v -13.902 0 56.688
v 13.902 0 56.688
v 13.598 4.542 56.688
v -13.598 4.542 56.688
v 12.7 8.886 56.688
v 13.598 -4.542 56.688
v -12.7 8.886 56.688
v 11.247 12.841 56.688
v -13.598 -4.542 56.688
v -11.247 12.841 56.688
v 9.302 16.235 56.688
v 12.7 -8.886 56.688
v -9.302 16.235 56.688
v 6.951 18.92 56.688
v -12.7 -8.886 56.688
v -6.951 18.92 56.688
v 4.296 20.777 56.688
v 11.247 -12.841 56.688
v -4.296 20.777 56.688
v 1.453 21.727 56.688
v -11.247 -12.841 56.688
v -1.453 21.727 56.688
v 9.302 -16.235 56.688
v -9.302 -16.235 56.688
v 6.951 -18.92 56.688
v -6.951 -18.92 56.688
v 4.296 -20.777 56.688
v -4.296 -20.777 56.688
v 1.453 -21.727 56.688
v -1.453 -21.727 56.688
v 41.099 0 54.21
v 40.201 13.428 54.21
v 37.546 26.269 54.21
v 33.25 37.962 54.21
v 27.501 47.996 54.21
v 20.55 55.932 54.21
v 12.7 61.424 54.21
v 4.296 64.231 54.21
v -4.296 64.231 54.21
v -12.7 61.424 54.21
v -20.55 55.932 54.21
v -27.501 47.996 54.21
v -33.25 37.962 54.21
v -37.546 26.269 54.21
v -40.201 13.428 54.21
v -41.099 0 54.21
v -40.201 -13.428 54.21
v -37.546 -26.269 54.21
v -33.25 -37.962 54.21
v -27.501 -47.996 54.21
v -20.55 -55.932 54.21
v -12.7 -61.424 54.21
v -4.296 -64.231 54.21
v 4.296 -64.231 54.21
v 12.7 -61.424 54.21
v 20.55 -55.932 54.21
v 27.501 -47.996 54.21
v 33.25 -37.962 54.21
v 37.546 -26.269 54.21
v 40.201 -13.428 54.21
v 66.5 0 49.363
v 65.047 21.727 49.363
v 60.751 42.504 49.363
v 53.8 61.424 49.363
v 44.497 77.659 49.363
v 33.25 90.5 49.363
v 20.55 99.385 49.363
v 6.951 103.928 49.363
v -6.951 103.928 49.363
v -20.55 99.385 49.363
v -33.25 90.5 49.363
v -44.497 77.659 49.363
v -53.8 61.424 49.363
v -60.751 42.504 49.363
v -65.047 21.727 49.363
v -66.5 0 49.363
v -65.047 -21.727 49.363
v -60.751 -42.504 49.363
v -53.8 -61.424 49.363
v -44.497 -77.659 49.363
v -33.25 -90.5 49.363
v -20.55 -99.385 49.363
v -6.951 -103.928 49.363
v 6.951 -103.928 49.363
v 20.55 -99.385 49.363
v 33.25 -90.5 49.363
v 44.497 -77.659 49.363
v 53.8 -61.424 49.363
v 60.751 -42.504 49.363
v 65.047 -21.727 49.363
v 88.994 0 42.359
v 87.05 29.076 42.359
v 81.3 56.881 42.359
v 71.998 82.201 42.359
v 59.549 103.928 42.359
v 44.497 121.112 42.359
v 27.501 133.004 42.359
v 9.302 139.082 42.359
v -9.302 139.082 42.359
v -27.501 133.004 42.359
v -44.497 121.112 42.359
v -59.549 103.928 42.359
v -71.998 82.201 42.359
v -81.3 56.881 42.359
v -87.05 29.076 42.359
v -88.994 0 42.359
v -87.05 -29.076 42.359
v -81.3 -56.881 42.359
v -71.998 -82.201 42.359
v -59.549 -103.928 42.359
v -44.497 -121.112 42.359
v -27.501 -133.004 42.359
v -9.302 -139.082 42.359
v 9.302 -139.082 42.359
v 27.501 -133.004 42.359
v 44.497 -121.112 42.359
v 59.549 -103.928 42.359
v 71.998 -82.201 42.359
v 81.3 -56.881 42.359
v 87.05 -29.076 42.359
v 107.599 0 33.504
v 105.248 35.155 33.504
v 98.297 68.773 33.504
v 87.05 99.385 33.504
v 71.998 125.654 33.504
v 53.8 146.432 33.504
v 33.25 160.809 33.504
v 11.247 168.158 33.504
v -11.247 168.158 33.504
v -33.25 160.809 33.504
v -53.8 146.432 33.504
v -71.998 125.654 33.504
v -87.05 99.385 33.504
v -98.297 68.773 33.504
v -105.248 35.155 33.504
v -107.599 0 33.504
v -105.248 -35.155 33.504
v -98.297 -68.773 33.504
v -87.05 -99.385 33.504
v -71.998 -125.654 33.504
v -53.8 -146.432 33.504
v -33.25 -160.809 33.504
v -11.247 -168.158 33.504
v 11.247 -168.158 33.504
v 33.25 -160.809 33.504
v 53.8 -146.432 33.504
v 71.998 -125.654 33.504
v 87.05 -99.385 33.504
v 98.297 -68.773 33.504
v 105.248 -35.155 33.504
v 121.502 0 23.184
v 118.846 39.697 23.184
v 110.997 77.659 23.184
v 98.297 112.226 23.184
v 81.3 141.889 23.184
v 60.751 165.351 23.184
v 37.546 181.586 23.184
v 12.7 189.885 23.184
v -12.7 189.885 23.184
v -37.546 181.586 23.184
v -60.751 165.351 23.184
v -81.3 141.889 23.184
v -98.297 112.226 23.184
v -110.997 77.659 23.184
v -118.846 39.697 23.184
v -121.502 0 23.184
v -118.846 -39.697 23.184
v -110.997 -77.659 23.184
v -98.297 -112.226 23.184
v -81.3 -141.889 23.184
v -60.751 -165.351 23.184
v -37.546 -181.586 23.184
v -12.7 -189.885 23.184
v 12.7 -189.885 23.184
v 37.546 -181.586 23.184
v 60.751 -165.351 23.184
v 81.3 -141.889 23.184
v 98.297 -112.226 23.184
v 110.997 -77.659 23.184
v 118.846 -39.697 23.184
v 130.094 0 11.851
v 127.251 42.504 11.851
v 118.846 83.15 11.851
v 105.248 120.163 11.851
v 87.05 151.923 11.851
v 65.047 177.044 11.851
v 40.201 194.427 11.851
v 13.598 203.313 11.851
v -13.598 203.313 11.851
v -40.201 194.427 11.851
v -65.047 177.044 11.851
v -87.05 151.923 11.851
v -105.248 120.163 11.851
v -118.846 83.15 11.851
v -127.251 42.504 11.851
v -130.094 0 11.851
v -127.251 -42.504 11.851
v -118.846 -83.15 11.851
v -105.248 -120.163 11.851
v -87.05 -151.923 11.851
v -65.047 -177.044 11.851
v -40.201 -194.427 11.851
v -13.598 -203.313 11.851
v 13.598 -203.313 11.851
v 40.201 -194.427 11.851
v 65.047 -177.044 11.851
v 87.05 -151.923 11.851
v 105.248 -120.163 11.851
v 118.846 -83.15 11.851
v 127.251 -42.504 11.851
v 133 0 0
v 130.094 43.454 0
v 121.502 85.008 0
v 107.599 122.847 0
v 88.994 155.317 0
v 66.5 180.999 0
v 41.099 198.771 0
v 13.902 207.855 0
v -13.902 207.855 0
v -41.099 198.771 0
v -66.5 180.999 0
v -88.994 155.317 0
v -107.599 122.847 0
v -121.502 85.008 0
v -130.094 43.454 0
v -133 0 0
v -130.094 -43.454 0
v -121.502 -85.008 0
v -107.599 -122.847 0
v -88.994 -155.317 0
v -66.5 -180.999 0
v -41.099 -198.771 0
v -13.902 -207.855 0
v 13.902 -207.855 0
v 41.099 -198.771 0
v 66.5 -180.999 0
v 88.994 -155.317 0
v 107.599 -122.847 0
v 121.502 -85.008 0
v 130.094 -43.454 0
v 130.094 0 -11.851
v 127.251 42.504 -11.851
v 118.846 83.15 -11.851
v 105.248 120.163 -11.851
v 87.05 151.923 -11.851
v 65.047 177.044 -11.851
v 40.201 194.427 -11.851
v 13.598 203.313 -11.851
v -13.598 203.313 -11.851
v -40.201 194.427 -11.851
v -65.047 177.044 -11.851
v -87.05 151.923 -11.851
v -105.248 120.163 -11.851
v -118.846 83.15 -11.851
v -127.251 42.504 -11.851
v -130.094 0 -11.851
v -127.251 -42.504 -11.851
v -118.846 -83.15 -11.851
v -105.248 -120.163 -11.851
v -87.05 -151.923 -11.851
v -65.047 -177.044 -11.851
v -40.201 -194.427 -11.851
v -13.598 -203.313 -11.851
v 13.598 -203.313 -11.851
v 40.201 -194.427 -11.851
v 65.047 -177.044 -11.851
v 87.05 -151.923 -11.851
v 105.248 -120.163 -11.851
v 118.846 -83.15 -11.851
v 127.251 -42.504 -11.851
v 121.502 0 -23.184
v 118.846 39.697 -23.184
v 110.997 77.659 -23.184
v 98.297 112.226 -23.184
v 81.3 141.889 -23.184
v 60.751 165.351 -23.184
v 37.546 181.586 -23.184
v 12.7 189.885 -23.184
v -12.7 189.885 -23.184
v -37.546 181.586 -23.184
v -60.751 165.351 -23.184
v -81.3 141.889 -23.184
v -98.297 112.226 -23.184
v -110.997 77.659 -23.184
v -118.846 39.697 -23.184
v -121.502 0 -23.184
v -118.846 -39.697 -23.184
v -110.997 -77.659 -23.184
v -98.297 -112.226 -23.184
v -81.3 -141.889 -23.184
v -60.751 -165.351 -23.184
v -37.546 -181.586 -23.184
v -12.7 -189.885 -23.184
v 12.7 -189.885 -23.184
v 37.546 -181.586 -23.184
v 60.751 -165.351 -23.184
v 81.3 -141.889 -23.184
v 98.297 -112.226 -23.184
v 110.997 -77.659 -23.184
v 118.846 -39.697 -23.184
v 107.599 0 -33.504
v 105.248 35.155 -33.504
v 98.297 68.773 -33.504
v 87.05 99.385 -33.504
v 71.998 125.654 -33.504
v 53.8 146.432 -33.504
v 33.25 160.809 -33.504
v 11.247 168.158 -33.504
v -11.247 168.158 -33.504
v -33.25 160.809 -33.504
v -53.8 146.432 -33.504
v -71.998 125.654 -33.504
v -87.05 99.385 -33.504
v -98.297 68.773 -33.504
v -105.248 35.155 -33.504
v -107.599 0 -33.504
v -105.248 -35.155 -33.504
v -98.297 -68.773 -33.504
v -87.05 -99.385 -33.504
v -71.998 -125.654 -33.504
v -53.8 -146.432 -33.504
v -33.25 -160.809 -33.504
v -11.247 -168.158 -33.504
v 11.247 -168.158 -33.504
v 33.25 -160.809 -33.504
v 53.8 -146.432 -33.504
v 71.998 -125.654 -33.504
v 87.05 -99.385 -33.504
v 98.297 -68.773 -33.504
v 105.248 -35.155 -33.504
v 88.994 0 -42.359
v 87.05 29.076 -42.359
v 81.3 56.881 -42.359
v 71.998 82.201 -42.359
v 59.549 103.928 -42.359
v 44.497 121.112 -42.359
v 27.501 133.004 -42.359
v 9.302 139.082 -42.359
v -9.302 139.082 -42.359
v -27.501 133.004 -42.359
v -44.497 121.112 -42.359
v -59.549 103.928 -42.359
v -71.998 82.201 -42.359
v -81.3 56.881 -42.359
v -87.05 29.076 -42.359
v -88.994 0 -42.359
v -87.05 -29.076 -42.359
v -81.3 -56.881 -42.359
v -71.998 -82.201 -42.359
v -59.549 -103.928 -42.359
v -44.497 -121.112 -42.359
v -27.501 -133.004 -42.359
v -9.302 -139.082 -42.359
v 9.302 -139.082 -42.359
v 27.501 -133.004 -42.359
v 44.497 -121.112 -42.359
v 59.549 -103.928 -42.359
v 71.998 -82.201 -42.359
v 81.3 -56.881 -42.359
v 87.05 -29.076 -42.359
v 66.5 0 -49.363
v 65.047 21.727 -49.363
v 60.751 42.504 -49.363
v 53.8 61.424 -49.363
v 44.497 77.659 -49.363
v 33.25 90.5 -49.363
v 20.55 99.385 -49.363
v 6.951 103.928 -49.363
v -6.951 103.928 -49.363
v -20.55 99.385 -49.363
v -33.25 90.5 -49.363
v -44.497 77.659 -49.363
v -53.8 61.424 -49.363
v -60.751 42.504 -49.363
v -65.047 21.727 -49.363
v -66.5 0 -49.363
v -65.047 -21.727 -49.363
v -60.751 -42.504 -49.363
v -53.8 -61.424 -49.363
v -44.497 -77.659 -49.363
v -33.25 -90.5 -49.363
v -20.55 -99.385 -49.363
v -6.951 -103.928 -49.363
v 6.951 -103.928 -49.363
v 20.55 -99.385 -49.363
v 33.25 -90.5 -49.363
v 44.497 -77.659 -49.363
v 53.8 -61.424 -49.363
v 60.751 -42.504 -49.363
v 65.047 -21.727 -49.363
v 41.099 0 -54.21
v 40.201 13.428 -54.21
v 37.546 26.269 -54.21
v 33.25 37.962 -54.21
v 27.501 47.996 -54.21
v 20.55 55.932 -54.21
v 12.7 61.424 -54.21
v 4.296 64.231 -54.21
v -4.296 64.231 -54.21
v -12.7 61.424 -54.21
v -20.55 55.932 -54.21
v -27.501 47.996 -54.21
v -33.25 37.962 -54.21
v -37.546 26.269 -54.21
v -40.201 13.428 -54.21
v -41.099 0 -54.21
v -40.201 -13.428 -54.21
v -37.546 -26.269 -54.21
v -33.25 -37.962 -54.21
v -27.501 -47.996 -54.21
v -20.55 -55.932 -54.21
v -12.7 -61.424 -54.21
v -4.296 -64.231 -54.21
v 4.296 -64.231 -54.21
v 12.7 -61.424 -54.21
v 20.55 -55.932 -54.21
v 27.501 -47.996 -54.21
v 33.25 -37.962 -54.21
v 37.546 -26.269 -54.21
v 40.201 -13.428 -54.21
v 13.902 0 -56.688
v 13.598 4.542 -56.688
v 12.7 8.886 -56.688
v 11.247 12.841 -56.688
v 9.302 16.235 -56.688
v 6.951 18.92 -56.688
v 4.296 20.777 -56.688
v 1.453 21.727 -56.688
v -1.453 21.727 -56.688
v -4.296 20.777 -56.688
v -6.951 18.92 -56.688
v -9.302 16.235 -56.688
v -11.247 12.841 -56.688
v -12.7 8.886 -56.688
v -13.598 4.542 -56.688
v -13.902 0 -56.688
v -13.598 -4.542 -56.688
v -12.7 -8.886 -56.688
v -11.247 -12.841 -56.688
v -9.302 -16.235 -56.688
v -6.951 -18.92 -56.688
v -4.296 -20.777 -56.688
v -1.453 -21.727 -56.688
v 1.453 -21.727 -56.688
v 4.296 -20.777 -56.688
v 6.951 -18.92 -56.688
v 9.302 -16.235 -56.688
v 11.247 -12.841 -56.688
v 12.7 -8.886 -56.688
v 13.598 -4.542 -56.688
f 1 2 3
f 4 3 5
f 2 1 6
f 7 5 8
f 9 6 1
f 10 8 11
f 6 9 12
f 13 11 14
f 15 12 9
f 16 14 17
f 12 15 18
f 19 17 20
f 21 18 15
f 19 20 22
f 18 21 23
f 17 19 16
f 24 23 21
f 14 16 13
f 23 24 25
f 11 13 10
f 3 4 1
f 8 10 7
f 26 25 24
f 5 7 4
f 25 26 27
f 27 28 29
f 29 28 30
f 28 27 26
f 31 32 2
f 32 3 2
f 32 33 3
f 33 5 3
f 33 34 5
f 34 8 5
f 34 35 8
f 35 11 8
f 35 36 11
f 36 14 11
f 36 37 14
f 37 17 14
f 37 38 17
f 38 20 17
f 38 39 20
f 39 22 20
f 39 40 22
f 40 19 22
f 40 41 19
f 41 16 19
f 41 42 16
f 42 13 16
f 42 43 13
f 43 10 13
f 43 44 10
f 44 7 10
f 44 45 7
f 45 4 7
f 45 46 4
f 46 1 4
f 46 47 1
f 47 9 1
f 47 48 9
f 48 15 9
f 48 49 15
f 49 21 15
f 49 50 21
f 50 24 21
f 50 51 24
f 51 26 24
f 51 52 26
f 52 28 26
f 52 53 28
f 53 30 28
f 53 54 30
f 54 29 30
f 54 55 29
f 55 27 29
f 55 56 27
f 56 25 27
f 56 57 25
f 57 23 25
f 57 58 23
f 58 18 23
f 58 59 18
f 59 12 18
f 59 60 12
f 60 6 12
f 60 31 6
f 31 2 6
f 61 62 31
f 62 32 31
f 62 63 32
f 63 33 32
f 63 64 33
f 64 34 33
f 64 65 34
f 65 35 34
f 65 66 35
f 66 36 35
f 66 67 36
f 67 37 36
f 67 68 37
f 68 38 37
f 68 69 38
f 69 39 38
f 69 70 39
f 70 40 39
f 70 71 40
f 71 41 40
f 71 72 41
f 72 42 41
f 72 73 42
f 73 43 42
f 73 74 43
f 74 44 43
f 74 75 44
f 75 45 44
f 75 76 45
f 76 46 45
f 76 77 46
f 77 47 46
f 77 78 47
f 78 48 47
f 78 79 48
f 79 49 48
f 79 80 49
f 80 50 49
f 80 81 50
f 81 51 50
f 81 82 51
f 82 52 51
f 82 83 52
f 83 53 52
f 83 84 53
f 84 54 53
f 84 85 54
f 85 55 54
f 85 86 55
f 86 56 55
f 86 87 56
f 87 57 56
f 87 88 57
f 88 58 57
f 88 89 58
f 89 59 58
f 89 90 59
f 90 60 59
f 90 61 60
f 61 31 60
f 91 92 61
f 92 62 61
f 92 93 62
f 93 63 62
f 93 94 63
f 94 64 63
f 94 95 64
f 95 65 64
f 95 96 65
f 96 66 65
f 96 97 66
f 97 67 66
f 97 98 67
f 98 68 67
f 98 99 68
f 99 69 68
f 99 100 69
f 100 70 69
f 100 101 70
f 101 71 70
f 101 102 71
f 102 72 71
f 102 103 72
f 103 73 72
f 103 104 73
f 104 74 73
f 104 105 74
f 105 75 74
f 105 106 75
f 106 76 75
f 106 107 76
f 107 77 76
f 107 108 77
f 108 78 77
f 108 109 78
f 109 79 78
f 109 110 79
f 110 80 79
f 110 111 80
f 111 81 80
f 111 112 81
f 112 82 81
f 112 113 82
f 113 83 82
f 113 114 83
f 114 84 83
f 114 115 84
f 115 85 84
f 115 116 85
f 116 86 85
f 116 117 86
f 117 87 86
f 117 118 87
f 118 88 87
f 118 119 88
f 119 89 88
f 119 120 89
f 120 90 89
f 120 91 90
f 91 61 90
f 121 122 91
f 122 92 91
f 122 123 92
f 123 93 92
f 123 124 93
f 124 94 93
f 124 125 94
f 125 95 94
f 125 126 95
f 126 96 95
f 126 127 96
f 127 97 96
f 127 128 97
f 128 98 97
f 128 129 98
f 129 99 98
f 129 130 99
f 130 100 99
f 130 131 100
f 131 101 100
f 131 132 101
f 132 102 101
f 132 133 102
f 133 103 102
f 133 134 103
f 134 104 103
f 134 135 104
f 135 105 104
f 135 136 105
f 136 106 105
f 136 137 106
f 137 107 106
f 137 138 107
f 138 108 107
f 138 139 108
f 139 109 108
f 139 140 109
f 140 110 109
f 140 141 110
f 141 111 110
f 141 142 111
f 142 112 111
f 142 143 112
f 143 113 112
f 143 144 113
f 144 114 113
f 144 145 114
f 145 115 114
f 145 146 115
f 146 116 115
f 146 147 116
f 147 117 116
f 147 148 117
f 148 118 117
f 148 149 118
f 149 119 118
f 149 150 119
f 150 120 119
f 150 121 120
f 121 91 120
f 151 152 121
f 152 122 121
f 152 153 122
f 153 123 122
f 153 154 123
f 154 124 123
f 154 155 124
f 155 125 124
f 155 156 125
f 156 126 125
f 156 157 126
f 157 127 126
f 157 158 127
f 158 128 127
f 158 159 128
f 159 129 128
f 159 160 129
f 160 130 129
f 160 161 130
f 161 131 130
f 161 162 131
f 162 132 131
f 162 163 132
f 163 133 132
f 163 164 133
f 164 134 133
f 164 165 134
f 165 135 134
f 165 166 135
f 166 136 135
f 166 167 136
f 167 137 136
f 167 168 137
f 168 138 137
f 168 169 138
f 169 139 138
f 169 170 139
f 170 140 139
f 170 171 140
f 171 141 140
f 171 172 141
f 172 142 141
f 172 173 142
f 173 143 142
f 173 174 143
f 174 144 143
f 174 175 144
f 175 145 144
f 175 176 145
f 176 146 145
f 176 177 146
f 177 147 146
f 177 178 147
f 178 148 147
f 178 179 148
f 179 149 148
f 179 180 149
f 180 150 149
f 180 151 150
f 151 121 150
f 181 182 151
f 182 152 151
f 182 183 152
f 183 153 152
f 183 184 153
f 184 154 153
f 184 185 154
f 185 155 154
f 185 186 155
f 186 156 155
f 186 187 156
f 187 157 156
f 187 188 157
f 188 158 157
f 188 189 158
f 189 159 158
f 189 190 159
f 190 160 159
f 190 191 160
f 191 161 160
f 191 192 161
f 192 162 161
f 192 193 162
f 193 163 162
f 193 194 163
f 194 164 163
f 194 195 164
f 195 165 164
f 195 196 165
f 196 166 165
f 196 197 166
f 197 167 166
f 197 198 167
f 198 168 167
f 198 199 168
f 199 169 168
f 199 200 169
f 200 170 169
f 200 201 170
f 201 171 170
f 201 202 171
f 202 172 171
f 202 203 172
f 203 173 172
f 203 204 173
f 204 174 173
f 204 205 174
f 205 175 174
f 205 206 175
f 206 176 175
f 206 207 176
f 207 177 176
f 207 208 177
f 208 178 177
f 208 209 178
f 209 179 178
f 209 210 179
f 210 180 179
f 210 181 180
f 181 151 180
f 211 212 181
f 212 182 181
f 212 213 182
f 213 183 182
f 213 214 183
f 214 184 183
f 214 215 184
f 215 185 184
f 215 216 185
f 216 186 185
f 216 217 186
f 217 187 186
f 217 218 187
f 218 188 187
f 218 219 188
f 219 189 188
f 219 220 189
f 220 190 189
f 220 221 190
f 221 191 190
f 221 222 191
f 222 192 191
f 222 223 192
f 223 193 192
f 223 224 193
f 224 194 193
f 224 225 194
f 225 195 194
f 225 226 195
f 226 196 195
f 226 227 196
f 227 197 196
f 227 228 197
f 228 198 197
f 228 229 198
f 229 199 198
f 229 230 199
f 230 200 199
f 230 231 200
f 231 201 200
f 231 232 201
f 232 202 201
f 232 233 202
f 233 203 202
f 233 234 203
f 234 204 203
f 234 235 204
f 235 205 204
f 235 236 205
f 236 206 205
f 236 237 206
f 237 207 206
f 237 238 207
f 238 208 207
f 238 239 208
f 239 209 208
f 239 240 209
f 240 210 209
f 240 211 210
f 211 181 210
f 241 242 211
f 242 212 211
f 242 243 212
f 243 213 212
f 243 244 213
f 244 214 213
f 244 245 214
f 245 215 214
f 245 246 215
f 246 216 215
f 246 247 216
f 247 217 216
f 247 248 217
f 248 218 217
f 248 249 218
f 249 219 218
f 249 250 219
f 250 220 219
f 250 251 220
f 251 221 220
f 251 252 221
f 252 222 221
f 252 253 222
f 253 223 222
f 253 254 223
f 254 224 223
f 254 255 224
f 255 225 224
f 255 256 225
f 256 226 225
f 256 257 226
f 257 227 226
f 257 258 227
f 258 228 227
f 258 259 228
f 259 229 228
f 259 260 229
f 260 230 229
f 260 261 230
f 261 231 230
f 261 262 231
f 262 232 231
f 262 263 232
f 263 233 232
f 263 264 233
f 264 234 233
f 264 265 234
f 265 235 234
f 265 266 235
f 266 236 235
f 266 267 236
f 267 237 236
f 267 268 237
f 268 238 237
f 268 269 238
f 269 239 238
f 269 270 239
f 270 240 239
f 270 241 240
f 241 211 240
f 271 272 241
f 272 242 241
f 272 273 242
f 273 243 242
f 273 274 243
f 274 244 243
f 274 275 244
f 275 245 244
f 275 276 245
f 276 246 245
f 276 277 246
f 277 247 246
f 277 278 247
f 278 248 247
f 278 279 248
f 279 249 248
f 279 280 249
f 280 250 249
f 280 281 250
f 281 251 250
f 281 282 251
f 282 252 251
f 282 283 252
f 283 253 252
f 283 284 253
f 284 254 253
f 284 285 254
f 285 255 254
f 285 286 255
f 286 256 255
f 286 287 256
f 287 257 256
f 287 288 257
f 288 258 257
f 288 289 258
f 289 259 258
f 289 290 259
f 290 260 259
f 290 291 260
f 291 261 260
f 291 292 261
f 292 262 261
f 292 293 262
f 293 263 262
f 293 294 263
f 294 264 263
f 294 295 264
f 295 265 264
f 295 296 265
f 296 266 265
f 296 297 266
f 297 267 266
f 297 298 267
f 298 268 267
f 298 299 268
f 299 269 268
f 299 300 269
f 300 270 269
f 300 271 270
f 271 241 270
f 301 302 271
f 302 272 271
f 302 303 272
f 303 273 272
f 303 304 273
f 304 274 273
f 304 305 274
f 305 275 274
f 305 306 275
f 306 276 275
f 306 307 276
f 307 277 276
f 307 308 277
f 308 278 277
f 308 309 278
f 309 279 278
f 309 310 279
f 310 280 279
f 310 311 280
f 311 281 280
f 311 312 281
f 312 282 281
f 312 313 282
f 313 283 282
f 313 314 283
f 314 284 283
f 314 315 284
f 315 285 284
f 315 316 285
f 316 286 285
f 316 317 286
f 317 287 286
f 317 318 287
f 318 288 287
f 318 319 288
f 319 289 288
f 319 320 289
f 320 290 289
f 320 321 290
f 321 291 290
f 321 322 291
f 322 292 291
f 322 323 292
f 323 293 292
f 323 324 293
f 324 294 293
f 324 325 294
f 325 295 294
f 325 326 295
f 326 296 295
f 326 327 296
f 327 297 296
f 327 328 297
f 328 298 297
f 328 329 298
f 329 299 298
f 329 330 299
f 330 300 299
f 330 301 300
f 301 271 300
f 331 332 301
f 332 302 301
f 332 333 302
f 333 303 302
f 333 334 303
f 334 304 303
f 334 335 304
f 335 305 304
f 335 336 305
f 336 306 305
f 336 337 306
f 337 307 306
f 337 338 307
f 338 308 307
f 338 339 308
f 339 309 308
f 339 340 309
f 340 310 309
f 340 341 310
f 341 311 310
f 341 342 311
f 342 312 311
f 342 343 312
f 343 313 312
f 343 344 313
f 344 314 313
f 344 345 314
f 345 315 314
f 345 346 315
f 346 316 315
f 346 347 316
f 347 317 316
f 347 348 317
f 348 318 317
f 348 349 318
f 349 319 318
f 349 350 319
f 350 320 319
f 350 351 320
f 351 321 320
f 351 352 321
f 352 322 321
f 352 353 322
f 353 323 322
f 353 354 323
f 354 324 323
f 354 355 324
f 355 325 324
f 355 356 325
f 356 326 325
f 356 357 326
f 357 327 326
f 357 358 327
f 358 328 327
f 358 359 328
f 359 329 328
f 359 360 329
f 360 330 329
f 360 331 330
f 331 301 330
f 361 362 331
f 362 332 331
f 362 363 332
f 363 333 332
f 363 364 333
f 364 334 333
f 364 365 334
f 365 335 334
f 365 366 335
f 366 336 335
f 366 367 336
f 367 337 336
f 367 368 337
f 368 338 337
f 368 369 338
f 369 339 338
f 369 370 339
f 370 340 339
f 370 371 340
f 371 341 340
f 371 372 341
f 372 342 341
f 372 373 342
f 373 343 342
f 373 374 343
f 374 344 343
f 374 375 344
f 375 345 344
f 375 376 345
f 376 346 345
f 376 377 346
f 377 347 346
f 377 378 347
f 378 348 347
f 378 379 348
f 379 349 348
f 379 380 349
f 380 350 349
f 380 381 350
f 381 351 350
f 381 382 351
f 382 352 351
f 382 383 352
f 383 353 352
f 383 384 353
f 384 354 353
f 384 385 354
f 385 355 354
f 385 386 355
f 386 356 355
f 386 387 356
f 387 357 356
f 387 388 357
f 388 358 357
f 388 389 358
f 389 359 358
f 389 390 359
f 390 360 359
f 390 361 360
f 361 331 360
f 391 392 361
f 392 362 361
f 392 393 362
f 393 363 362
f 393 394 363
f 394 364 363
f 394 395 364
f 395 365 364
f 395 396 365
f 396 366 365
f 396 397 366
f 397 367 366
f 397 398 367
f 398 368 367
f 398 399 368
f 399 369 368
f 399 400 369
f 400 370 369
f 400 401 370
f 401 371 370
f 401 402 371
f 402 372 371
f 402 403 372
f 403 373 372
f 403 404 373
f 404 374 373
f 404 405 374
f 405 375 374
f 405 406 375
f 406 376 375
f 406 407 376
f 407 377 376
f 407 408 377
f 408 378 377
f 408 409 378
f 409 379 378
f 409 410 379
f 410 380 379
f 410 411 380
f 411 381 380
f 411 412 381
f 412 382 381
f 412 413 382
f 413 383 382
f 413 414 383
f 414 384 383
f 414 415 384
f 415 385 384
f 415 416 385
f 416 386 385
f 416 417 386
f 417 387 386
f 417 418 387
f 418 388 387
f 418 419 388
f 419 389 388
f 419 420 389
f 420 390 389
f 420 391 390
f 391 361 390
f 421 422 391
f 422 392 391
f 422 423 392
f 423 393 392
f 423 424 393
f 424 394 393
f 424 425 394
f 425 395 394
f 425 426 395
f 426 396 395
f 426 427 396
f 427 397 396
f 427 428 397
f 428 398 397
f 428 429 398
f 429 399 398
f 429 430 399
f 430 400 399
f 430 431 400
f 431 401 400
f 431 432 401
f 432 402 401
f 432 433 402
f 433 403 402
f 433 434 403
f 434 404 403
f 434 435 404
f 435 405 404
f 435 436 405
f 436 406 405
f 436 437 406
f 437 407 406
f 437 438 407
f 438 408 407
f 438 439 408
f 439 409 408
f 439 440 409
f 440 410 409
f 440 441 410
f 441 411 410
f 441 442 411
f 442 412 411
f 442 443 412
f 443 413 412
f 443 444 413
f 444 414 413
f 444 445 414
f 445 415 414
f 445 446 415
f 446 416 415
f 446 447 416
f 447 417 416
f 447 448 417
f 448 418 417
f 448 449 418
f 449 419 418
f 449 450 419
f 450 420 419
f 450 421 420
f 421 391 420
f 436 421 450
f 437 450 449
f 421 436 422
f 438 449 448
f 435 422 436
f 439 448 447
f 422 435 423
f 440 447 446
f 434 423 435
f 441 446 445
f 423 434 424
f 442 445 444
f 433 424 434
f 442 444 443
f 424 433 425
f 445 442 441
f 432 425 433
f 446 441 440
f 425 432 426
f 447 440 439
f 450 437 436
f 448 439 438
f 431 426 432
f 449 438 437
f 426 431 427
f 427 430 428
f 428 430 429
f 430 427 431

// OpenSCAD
// Generated by SolidPython 1.0.1 on 2020-07-29 00:46:47


scale(v = [7, 11, 3]) {
	sphere(r = 19);
}
/***********************************************
*********      SolidPython code:      **********
************************************************
 
# import packages: SolidPython
from solid import *
from solid.utils import *
from itertools import chain, combinations, permutations


class Resize:

    def __init__(self, scad_file):
        self.scad_file = scad_file
        #self.scad_file = import_scad(scad_file)
        # cone/cylinder param:
        self.r1 = 0
        self.r2 = 0
        self.h = 0
        # rectangular prism param:
        self.w = 0
        self.l = 0
        # ellipse param:
        self.r = 0

    # import OpenScad code (file name corresponds to shape)


    # classify shape + parameters
    def assign(self, param1, param2, param3):
        if self.scad_file == 'cone.scad':
            self.r1 = param1
            self.r2 = param2
            self.h = param3
        elif self.scad_file == 'cylinder.scad':
            self.r1 = param1
            self.r2 = param2
            self.h = param3
        elif self.scad_file == 'rectangularPrism.scad':
            self.h = param1
            self.l = param2
            self.w = param3
        else:
            self.r = param1
            self.h = param2

    # resize parameters
    def iterate(self):
        x = range(3, 20, 2)
        i = 1
        if self.scad_file == 'cone.scad':
            tempList = list(permutations(x, 2))
            for temp in tempList:
                param1 = temp[0]
                param2 = temp[1]
                filepath = 'produced_scad_files/' + 'cone' + str(param1) + '_' + str(param2) + '_' + '.scad'
                scad_render_to_file(cylinder(h=param1, r1=param2, r2=0), filepath)

        elif self.scad_file == 'cylinder.scad':
            tempList = list(permutations(x, 3))
            for temp in tempList:
                param1 = temp[0]
                param2 = temp[1]
                filepath = 'produced_scad_files/' + 'cylinder' + str(param1) + '_' + str(param2) + '_' + '.scad'
                scad_render_to_file(cylinder(h=param1, r1=param2, r2=param2), filepath)

        elif self.scad_file == 'rectangularPrism.scad':
            tempList = list(permutations(x, 3))
            for temp in tempList:
                param1 = temp[0]
                param2 = temp[1]
                param3 = temp[2]
                filepath = 'produced_scad_files/' + 'rectangularPrism' + str(param1) + '_' + str(param2) + '_' + str(
                    param3) + '.scad'
                scad_render_to_file(cube(size=(param1, param2, param3)), filepath)

        elif self.scad_file == 'ellipse.scad':
            tempList = list(permutations(x, 4))
            for temp in tempList:
                param1 = temp[0]
                param2 = temp[1]
                param3 = temp[2]
                param4 = temp[3]
                filepath = 'produced_scad_files/' + 'ellipse' + str(param1) + '_' + str(param2) + '_' + str(param3) + '_' + str(param4) + '.scad'
                scad_render_to_file(scale([param1, param2, param3])(sphere(r=param4)), filepath)

    def render_to_scadfile(self):
        scad_render_to_file(scad, 'example.scad') 
 
************************************************/
